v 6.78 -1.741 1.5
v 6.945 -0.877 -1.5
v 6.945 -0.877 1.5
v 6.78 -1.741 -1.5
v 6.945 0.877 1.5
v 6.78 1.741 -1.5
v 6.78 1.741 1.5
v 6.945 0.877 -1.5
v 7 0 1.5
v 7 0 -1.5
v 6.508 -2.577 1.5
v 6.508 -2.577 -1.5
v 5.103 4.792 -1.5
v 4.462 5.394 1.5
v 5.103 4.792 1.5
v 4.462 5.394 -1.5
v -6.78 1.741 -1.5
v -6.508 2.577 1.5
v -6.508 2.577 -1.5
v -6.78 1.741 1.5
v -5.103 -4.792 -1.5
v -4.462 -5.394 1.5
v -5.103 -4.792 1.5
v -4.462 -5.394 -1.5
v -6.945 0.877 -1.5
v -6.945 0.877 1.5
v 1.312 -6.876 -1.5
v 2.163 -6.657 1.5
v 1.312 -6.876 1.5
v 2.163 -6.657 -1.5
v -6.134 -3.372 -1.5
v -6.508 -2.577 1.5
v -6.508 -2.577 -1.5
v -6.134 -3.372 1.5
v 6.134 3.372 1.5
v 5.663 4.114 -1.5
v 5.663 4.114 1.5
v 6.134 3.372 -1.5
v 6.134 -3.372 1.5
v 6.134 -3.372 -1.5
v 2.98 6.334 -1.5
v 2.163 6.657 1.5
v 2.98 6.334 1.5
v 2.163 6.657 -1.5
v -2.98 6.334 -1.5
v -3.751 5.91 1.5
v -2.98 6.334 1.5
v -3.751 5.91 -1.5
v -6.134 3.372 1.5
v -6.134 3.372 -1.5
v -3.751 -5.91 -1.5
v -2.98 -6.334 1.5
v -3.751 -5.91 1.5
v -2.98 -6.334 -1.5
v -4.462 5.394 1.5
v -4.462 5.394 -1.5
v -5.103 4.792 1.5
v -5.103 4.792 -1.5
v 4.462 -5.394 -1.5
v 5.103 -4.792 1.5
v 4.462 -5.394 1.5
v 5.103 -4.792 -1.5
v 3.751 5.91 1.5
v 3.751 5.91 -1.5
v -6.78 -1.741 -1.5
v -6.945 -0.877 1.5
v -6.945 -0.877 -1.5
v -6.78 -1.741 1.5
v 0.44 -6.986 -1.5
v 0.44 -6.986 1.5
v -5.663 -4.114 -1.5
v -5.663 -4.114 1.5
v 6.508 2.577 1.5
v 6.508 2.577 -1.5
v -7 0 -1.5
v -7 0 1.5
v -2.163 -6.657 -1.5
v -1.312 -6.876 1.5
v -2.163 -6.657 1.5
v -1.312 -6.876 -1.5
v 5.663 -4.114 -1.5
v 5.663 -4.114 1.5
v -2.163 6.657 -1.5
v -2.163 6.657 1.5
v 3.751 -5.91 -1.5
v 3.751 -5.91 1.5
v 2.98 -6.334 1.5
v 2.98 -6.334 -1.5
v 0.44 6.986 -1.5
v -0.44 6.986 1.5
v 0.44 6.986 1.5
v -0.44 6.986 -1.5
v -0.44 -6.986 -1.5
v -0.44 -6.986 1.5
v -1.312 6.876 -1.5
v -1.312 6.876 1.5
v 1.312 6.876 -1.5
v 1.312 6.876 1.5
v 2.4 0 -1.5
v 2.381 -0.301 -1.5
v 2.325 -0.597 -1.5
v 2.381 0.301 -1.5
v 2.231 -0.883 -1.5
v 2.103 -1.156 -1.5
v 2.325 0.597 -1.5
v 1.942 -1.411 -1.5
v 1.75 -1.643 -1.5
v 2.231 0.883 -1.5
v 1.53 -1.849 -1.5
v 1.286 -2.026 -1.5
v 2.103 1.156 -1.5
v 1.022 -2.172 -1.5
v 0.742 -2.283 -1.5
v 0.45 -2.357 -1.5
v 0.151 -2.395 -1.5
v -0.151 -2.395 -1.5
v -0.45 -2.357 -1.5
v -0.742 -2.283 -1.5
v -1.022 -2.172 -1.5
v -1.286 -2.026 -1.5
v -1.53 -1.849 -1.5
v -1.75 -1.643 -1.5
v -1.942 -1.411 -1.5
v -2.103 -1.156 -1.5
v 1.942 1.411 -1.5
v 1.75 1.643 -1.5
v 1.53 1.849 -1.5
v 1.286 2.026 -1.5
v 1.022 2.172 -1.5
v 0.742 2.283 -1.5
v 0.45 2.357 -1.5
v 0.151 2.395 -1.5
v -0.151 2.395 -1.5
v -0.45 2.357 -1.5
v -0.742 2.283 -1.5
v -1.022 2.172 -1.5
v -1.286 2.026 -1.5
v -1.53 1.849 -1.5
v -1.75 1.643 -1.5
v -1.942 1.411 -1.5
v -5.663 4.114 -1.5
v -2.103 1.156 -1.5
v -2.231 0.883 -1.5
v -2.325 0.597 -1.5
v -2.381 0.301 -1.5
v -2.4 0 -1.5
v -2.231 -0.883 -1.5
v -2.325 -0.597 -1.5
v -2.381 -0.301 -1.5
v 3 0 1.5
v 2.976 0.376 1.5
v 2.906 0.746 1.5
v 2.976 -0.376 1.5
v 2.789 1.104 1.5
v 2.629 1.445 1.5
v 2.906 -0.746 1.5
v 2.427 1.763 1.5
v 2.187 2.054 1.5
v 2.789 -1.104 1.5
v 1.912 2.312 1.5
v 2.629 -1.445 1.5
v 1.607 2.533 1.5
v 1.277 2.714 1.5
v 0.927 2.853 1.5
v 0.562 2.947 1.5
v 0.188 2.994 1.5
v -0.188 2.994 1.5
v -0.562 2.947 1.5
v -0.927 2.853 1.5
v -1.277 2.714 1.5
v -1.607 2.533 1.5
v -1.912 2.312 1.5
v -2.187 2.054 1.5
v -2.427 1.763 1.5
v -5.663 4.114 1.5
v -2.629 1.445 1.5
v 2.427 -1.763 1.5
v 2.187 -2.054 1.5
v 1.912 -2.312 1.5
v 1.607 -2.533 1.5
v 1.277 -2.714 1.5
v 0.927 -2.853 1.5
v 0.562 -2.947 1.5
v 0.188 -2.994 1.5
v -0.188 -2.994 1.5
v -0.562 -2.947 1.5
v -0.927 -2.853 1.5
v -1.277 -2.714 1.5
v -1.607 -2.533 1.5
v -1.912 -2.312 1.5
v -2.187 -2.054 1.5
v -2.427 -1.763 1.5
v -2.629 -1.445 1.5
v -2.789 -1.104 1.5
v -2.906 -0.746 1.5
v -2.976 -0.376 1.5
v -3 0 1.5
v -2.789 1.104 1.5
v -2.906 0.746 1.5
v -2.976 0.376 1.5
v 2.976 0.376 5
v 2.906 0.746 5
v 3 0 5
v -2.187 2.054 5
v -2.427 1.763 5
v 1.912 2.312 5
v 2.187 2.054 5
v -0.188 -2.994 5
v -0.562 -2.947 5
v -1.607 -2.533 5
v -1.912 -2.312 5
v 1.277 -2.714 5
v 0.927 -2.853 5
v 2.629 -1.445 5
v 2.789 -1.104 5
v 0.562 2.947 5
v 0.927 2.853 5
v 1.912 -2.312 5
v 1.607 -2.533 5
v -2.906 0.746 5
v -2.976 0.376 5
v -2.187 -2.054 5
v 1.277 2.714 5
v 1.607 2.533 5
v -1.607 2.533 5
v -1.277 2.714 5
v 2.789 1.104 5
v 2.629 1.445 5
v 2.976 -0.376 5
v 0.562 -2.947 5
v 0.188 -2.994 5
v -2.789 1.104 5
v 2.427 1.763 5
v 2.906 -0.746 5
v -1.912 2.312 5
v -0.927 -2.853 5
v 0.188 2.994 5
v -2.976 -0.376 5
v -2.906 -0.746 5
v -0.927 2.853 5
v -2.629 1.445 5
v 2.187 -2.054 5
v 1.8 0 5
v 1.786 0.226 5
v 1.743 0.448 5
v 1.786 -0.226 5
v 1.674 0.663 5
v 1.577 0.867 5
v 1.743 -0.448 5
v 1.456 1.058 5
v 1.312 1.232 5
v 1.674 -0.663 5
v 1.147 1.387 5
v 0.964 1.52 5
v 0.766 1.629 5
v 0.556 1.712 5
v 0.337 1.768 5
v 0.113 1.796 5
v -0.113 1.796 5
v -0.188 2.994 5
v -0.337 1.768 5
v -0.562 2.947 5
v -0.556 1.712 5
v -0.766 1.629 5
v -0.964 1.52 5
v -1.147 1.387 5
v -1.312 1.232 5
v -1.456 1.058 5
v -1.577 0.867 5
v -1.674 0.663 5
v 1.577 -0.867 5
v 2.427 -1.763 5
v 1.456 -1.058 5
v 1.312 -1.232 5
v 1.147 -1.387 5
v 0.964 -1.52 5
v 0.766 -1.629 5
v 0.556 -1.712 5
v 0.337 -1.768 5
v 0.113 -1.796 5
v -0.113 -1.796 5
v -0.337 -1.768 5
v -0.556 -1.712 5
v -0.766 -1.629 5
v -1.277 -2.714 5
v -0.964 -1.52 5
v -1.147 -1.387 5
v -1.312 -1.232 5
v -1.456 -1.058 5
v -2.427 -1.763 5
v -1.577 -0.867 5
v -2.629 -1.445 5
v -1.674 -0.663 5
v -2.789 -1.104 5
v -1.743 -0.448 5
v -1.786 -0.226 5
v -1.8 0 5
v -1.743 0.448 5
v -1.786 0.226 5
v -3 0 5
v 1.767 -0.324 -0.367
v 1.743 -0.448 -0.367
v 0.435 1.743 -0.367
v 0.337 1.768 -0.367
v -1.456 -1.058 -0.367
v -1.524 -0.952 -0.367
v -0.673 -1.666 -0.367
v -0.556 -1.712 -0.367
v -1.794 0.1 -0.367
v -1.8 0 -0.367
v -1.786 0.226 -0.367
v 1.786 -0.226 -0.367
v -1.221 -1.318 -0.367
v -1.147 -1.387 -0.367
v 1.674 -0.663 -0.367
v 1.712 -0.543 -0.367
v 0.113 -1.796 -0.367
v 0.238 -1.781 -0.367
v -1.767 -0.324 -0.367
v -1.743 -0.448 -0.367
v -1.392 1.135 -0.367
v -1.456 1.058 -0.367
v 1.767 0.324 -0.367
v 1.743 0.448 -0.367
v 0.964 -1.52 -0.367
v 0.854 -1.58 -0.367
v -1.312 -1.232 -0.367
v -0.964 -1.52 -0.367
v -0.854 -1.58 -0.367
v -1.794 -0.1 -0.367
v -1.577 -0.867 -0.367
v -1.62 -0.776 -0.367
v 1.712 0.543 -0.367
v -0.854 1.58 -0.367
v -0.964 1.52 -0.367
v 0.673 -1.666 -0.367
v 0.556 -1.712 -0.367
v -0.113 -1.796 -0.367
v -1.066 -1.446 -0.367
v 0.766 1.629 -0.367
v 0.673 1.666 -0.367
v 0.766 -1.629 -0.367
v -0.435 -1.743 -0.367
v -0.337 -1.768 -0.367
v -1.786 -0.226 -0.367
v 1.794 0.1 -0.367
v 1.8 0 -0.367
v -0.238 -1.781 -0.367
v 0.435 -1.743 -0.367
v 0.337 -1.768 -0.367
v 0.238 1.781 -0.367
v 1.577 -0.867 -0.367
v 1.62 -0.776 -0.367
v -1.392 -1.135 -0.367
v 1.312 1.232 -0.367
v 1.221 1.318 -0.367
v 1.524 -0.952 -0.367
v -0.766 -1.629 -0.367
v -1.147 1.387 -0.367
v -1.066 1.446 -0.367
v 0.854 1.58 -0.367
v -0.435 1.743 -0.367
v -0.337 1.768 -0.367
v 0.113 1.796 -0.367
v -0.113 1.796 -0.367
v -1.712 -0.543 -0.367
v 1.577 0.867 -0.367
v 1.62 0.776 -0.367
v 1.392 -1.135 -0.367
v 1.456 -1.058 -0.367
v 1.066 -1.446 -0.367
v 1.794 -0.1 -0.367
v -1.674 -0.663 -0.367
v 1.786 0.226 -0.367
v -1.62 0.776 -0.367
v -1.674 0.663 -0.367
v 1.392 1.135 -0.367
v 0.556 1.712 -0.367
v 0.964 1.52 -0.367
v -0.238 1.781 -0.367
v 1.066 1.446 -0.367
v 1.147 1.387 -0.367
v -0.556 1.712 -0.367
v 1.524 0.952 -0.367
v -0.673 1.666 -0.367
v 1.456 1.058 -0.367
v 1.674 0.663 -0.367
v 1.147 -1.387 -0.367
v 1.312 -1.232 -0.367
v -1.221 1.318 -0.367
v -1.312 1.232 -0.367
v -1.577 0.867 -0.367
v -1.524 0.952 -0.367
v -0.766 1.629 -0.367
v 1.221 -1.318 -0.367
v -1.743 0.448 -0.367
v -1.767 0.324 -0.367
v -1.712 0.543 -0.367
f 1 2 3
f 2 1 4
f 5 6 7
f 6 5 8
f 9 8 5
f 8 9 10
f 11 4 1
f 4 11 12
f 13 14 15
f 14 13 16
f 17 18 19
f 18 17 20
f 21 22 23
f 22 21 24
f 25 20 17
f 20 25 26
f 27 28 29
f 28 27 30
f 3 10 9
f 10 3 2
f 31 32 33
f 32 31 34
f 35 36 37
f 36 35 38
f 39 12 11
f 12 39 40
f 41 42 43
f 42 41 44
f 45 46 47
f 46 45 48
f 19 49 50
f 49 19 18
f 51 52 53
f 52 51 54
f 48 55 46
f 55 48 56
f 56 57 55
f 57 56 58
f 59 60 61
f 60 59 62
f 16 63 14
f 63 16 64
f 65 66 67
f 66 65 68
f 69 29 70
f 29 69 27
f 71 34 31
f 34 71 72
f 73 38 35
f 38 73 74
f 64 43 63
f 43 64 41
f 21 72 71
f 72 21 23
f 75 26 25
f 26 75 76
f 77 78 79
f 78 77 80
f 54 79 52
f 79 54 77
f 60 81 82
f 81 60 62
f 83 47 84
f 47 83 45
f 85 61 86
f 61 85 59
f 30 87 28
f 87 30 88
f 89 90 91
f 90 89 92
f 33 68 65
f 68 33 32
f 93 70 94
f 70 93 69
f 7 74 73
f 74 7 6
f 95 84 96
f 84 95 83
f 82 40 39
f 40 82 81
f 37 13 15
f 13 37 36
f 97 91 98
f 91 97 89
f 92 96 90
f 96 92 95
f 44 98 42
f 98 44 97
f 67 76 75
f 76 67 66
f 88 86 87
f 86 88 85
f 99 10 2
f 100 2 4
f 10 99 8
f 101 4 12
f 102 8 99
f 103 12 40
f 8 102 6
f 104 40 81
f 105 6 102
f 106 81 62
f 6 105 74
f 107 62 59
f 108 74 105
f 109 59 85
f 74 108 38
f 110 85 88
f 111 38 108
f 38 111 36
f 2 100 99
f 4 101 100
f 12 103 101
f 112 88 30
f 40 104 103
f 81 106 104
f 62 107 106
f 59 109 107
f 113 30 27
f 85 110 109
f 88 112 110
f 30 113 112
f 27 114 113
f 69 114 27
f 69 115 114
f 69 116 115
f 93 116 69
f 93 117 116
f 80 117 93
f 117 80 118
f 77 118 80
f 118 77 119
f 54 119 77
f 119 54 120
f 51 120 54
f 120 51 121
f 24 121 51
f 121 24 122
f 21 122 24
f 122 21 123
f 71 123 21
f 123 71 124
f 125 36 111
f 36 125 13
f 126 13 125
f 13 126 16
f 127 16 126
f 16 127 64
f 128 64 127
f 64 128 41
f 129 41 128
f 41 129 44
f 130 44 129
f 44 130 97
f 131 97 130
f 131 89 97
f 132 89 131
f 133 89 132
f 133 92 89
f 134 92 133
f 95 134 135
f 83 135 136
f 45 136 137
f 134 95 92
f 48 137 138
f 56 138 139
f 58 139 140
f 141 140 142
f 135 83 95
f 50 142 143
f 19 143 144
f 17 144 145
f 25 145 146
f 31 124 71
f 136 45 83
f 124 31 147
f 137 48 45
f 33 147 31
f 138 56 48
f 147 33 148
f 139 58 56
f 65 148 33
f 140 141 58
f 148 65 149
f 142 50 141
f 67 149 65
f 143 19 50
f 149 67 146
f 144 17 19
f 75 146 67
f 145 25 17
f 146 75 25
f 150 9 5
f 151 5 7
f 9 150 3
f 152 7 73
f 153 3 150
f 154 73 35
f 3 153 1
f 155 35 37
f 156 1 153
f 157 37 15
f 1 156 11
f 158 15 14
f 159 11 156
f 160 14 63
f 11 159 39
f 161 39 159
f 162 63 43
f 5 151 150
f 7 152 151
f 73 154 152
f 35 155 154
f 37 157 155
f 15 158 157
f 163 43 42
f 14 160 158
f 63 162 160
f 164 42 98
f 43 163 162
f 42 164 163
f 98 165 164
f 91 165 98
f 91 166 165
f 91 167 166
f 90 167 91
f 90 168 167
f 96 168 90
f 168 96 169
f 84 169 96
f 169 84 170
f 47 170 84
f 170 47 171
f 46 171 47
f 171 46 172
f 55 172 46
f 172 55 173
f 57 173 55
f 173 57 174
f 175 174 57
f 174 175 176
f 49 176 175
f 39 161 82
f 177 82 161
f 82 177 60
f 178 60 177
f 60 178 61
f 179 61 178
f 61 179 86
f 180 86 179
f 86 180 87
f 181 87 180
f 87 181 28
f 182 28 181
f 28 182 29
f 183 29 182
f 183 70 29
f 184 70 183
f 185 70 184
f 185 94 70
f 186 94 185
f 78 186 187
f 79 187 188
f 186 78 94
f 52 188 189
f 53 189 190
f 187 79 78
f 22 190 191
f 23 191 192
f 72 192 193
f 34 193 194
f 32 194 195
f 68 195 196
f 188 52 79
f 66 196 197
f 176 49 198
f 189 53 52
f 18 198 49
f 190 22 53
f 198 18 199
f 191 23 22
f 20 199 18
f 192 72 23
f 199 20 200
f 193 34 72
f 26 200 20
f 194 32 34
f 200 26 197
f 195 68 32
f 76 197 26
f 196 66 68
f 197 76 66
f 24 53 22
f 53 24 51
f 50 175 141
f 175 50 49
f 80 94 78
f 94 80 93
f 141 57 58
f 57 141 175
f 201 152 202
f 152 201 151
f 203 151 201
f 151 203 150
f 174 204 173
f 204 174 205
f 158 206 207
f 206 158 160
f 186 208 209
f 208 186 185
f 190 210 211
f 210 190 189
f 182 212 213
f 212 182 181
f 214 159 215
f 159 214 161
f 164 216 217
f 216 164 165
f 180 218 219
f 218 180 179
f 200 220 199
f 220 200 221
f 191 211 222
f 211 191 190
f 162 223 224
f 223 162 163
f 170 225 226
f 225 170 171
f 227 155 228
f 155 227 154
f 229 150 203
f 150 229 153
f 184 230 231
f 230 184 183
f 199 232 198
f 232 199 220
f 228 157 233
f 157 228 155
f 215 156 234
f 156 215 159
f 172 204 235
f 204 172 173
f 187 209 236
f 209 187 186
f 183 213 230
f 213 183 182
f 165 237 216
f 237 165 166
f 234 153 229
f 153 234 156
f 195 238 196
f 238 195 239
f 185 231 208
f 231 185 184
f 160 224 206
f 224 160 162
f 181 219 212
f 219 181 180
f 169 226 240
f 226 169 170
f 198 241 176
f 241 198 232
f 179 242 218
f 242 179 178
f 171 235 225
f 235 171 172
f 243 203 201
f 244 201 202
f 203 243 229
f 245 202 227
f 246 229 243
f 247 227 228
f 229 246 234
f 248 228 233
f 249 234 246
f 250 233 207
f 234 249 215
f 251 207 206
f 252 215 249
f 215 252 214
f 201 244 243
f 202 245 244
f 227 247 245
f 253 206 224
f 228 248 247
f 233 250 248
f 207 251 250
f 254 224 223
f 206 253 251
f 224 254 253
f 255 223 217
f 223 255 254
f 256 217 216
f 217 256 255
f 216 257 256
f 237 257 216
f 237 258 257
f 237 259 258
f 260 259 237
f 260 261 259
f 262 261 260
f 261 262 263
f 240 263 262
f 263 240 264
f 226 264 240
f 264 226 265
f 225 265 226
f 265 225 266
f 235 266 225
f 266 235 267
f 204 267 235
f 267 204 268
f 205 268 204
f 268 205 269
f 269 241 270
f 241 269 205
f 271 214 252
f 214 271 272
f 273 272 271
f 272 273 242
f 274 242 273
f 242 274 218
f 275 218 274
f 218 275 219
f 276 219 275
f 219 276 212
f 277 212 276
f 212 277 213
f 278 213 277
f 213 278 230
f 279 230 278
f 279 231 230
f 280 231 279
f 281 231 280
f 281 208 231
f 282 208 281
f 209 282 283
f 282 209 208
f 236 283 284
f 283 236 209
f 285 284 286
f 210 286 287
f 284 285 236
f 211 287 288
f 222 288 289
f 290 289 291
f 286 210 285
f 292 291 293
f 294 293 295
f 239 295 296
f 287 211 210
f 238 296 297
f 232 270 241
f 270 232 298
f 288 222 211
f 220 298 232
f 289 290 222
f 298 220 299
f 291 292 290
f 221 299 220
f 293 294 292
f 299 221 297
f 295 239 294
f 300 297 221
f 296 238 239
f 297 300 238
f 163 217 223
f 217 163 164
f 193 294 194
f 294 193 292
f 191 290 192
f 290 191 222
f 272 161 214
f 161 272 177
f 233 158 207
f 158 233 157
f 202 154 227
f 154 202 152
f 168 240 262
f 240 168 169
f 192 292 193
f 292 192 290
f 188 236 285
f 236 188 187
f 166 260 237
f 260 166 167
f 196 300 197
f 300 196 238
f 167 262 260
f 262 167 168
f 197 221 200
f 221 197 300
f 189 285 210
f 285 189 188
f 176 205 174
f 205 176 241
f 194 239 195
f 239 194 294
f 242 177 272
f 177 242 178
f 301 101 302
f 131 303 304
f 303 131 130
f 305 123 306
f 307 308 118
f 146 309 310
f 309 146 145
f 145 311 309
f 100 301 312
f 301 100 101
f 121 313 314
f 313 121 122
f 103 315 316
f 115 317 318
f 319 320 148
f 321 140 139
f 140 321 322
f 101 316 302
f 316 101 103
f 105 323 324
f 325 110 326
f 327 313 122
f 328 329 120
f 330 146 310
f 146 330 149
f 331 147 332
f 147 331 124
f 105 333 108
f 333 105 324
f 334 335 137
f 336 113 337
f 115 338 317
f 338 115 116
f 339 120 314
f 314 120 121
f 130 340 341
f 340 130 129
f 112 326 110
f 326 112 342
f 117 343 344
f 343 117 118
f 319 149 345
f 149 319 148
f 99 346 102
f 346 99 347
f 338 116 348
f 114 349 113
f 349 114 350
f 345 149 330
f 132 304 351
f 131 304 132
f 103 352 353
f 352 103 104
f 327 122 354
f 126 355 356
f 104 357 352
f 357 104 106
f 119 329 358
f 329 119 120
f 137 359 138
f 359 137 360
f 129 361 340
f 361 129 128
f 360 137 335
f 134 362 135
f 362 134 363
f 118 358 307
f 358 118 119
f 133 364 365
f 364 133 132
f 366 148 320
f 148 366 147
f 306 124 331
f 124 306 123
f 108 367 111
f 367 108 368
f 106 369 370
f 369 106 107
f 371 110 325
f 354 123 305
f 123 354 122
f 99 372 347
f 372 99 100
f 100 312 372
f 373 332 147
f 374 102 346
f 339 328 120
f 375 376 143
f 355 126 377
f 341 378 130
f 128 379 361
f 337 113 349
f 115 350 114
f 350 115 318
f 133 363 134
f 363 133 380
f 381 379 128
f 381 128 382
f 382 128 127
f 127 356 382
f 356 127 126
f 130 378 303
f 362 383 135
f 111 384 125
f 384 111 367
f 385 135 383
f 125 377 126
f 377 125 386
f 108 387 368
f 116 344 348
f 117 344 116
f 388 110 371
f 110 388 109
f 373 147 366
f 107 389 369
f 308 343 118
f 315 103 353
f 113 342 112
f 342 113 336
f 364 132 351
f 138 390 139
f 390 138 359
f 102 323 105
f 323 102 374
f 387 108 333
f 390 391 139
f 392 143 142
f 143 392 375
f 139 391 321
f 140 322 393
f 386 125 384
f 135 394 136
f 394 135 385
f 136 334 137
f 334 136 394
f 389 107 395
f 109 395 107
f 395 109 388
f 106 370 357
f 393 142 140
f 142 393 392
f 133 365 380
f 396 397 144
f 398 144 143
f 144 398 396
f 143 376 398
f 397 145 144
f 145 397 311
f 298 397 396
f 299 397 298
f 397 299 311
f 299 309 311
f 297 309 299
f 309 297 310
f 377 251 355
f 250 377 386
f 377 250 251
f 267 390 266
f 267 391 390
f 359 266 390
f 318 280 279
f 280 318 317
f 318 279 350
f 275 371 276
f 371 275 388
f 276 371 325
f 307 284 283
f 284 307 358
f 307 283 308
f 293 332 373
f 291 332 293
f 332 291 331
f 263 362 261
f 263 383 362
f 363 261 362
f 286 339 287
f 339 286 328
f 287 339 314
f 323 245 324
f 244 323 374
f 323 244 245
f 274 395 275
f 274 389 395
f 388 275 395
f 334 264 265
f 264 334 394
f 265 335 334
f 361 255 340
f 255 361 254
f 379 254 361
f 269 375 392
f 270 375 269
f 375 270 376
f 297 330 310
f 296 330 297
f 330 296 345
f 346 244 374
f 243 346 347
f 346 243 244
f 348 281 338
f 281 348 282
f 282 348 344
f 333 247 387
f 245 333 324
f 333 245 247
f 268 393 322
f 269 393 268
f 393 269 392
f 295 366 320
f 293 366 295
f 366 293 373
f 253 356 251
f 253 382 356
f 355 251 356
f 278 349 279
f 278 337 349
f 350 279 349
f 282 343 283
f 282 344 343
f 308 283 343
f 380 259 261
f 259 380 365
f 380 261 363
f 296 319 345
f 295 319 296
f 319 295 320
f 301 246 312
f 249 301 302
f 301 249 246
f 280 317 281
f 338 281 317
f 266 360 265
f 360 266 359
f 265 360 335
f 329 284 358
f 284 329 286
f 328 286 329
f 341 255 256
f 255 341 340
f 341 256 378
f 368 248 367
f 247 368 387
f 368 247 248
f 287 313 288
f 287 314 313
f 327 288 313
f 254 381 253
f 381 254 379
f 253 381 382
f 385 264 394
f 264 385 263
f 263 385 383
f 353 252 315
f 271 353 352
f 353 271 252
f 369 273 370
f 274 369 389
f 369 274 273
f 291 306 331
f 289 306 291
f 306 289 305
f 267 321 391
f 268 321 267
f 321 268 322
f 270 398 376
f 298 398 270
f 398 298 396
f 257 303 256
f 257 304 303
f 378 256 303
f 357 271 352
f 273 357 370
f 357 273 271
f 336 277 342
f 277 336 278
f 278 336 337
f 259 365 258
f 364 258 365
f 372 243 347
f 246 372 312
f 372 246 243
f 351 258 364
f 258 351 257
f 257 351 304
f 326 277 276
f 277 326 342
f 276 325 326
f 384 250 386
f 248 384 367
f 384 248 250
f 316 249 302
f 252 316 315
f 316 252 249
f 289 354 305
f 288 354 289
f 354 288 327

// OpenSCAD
$fn = 50;


difference() {
	union() {
		translate(v = [0, 0, -1.5000000000]) {
			cylinder(h = 3, r = 7.0000000000);
		}
		translate(v = [0, 0, -1.5000000000]) {
			cylinder(h = 6.5000000000, r = 3.0000000000);
		}
	}
	union() {
		translate(v = [0, 0, -1.5000000000]) {
			rotate(a = [0, 180, 0]) {
				difference() {
					union() {
						translate(v = [0, 0, -1.7000000000]) {
							cylinder(h = 1.7000000000, r1 = 1.5000000000, r2 = 2.4000000000);
						}
						translate(v = [0, 0, -6.5000000000]) {
							cylinder(h = 6.5000000000, r = 1.5000000000);
						}
						translate(v = [0, 0, -6.5000000000]) {
							cylinder(h = 6.5000000000, r = 1.8000000000);
						}
						translate(v = [0, 0, -6.5000000000]) {
							cylinder(h = 6.5000000000, r = 1.5000000000);
						}
					}
					union();
				}
			}
		}
		translate(v = [0, 0, -100.0000000000]) {
			cylinder(h = 200, r = 1.5000000000);
		}
	}
}
